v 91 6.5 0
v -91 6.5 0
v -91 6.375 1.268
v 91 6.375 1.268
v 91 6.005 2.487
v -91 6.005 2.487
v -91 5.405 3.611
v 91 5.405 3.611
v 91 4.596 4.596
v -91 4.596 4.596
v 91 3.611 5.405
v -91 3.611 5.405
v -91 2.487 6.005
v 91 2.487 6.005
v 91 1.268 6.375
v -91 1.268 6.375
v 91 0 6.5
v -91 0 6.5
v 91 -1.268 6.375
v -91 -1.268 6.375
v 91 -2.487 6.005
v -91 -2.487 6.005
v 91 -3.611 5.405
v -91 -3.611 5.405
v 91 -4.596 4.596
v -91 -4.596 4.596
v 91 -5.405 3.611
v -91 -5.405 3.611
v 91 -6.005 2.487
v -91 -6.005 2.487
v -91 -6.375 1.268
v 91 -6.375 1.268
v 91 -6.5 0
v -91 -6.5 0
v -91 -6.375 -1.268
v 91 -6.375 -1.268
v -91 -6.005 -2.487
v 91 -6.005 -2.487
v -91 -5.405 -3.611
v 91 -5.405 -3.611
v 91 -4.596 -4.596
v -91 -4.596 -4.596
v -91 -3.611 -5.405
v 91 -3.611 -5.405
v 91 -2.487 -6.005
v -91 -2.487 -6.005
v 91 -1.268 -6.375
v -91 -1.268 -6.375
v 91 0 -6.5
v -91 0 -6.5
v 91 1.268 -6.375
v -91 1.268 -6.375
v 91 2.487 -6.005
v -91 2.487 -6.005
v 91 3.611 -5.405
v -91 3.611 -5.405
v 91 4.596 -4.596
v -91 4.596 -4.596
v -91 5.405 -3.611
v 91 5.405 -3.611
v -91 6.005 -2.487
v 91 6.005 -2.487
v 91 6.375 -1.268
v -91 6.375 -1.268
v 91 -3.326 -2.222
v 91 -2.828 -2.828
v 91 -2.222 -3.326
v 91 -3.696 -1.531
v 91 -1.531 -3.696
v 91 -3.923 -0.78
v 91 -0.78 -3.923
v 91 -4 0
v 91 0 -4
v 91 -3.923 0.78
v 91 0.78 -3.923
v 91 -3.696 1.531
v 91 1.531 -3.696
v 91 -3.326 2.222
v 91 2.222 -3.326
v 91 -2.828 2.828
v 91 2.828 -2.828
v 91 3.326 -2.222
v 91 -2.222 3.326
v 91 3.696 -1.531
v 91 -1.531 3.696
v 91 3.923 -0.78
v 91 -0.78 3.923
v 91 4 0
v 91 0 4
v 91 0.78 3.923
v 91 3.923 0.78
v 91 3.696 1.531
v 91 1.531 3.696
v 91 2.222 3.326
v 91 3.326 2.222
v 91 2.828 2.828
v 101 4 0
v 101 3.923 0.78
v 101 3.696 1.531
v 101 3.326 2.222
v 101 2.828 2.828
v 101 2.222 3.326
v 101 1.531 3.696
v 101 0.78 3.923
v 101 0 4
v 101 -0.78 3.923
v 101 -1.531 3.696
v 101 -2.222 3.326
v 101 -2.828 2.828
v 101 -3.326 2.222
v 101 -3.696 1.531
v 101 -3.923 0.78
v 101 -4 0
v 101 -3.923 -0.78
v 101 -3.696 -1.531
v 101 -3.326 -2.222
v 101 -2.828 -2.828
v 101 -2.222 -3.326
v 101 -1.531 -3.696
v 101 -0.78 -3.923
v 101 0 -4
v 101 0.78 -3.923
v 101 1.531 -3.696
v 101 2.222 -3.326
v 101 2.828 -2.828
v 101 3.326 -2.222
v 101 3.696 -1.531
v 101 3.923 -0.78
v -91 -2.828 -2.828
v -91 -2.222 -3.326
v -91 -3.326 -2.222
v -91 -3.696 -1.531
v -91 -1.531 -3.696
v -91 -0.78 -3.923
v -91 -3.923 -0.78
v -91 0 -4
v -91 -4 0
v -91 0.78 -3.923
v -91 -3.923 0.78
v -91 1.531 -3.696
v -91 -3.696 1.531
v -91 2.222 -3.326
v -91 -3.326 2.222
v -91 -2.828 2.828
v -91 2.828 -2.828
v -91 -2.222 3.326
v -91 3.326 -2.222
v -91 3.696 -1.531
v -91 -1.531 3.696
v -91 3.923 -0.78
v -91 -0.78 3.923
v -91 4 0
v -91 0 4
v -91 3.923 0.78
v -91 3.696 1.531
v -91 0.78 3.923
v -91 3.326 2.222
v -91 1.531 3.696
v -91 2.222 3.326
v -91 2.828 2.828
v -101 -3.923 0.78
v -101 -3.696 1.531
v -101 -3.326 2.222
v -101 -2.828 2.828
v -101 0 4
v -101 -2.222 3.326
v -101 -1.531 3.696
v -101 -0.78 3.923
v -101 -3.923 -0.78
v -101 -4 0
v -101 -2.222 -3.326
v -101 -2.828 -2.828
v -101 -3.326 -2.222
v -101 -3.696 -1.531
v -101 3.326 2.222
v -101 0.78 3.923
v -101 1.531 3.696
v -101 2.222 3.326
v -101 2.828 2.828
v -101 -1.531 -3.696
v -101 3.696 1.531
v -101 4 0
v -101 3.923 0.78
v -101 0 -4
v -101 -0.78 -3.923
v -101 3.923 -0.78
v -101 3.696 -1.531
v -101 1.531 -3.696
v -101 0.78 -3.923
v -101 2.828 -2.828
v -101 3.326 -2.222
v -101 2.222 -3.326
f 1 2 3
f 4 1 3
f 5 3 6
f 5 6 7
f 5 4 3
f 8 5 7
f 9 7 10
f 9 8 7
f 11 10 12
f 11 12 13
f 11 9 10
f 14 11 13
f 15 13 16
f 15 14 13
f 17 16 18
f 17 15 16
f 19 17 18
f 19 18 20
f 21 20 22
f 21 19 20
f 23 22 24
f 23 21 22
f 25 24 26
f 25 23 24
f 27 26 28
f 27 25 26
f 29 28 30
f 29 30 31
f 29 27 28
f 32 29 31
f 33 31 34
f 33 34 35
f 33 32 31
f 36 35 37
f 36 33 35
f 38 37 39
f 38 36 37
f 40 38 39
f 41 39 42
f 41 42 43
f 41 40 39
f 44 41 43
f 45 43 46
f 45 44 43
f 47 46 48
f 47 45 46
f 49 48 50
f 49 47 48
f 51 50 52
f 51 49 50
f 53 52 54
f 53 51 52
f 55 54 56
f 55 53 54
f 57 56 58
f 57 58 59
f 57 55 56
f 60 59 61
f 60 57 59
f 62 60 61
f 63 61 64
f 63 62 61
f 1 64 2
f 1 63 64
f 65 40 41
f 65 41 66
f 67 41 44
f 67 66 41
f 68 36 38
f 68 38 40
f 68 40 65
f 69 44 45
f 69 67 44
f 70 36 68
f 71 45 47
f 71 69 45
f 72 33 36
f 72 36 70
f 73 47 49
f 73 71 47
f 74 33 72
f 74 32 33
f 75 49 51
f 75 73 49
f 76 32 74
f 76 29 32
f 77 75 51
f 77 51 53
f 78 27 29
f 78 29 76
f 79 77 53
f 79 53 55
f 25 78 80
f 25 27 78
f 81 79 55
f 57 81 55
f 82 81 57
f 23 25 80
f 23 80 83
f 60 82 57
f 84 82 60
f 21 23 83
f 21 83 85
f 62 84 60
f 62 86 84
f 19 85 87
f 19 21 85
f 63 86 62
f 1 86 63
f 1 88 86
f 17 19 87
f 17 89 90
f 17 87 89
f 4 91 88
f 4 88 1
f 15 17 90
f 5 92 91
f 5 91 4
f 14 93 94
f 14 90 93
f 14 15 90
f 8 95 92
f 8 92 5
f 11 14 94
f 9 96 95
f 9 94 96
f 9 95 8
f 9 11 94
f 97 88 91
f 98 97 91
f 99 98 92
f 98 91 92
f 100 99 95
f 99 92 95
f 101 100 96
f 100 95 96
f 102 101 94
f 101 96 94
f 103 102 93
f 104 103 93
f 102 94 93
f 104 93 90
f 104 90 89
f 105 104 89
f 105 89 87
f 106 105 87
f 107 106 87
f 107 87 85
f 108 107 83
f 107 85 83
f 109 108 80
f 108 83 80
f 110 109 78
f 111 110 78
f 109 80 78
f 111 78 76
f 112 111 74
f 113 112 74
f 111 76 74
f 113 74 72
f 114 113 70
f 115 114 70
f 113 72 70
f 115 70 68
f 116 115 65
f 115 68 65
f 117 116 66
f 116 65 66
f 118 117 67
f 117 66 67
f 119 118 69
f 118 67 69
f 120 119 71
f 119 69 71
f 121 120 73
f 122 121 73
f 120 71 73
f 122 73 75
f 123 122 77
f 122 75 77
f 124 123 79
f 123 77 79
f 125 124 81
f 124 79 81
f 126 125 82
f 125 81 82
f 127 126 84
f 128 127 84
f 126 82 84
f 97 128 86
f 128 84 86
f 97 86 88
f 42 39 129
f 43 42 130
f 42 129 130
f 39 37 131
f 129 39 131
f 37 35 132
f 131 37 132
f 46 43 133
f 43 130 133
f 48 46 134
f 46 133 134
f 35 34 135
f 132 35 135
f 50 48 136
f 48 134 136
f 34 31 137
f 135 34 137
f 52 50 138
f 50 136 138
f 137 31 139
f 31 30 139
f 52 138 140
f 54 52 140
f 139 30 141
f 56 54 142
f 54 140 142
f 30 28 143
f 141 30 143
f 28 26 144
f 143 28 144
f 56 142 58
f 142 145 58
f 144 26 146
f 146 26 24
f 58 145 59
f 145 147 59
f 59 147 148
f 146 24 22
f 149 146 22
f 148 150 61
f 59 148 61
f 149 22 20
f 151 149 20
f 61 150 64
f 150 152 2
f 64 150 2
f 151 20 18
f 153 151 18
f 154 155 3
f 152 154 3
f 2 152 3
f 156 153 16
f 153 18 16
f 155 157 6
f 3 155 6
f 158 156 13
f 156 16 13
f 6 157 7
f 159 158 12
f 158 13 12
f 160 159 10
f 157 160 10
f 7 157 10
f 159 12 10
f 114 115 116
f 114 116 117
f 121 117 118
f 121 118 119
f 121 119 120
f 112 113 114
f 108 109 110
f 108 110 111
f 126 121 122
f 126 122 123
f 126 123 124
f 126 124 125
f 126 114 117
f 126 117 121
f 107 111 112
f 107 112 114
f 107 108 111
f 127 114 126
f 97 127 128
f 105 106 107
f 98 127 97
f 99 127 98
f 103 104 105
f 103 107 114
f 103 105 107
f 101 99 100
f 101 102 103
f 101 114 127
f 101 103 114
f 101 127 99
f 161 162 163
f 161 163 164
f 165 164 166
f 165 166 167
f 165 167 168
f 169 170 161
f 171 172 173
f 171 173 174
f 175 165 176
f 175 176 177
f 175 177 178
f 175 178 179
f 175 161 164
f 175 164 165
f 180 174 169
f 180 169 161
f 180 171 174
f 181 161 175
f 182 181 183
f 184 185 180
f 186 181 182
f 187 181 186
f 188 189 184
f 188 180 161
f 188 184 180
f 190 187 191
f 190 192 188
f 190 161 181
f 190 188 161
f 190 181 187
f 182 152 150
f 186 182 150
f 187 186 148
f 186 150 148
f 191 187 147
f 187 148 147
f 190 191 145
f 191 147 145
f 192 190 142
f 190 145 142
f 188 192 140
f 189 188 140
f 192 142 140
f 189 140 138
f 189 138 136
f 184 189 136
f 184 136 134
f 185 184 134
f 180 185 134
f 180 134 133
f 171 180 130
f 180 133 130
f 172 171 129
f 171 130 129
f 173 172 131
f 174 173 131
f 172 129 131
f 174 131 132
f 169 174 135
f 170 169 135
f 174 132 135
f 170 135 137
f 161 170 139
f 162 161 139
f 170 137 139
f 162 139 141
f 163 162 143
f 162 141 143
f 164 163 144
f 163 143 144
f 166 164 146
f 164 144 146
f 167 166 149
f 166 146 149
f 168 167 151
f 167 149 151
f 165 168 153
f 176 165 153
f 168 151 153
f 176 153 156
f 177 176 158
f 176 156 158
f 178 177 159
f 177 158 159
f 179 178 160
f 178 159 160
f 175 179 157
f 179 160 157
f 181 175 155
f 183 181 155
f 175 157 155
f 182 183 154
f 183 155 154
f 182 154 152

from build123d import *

# Parameters (mm, degrees)
SKETCH_R     = 6.5
PAD_DEPTH    = 91
SKETCH001_R  = 4
PAD001_DEPTH = 10
SKETCH002_R  = 4
PAD002_DEPTH = 10


with BuildPart() as part:
    # Sketch → Pad (new body, symmetric)
    with BuildSketch(Plane.YZ):
        Circle(SKETCH_R)
    extrude(amount=PAD_DEPTH, both=True)

    # Sketch001 (on Face3 of Pad) → Pad001 (join)
    with BuildSketch(Plane.YZ.offset(91)):
        Circle(SKETCH001_R)
    extrude(amount=PAD001_DEPTH)

    # Sketch002 (on Face2 of Pad001) → Pad002 (join)
    with BuildSketch(Plane(origin=(-91, 0, 0), x_dir=(0, 1, 0), z_dir=(-1, 0, 0))):
        Circle(SKETCH002_R)
    extrude(amount=PAD002_DEPTH)


solid = part.part
